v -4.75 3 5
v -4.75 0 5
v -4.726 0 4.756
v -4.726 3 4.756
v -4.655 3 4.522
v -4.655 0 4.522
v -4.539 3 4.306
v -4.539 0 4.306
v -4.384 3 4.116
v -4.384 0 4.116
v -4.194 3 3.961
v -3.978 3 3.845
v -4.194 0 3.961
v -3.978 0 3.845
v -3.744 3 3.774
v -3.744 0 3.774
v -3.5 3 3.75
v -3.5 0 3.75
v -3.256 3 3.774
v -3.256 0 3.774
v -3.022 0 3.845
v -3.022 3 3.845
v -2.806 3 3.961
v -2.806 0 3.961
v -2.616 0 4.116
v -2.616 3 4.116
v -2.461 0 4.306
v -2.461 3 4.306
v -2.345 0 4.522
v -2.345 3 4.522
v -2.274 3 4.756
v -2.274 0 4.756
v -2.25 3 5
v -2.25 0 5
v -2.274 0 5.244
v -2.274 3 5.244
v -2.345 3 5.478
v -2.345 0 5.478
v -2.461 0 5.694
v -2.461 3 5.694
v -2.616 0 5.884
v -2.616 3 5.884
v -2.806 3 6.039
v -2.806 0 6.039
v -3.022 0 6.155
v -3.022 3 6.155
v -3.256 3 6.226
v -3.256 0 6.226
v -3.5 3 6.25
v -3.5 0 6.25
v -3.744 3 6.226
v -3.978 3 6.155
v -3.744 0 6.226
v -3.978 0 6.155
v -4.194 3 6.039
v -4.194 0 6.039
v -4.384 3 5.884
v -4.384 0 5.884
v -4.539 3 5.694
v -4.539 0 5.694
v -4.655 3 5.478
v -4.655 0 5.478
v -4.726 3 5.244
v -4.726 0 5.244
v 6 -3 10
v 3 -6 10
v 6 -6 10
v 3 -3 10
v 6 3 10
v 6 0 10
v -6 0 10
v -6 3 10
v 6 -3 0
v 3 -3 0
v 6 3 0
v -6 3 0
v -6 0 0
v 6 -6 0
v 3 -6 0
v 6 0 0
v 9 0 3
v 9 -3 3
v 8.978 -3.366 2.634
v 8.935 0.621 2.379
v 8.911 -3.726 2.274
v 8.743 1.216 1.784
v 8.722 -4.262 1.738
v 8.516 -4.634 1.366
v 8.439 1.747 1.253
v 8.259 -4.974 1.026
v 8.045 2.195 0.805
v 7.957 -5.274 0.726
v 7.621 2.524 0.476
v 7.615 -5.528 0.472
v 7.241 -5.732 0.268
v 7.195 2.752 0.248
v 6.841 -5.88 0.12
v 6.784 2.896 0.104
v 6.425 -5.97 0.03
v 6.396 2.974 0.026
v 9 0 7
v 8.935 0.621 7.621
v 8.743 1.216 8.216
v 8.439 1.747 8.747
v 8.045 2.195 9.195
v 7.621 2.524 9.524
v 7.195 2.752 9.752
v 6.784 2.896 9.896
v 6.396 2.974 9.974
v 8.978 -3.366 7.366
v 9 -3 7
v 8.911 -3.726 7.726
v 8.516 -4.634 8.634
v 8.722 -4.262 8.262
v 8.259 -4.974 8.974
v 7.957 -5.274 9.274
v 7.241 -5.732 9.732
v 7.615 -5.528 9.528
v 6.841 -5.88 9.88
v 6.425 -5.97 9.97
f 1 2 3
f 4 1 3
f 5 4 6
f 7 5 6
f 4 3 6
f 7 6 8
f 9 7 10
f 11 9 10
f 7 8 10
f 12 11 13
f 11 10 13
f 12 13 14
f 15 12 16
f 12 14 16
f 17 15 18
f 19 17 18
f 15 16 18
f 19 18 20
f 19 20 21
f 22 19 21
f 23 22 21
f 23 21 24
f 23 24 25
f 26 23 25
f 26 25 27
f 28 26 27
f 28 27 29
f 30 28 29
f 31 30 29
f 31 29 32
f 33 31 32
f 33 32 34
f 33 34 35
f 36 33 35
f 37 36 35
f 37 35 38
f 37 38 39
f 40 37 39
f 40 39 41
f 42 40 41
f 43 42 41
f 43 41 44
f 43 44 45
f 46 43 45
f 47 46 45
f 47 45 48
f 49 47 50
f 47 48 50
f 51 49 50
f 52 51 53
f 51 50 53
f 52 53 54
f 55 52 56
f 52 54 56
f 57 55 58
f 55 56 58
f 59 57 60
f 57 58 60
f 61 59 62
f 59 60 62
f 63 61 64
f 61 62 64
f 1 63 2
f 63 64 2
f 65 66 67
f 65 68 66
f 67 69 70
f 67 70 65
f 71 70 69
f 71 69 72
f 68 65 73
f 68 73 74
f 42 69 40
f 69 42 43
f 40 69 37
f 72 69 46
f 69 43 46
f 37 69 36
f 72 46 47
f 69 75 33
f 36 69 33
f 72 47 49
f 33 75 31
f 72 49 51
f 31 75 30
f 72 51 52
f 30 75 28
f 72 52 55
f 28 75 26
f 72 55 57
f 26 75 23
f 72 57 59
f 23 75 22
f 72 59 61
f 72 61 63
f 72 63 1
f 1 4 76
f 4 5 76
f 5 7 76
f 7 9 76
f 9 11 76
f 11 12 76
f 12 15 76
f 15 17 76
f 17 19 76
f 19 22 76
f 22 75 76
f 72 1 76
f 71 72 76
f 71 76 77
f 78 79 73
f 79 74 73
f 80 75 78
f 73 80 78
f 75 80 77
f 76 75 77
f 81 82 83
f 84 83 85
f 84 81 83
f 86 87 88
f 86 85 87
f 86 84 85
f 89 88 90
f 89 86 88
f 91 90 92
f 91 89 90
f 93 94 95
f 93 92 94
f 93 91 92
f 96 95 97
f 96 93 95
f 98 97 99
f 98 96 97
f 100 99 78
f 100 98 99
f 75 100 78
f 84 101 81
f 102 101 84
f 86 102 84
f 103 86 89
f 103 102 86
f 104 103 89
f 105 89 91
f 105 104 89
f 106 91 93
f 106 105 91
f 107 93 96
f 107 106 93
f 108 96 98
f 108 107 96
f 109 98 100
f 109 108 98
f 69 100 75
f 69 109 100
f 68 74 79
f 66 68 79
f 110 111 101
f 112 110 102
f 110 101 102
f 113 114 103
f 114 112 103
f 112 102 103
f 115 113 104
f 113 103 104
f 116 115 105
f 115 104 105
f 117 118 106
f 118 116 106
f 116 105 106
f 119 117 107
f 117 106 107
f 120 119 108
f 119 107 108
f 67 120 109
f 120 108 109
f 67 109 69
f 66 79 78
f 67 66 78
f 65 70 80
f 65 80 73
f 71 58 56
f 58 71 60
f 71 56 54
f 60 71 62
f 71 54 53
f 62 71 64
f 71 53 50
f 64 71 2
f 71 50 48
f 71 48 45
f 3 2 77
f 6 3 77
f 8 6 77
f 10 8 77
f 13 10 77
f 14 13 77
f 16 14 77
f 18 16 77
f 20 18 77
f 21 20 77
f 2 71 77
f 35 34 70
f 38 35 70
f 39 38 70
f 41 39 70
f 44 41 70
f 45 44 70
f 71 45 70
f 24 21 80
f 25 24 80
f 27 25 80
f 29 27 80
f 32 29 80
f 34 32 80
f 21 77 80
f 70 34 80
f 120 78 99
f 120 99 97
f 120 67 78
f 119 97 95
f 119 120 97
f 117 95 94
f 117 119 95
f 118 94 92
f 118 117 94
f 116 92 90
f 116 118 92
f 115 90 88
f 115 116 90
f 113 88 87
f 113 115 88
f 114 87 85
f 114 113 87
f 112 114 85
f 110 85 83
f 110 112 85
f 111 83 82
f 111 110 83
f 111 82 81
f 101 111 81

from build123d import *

# Parameters (mm, degrees)
ESTRUSIONE_ESTRUSIONE1_DEPTH = 10
RACCORDO1_R                  = 3
FORO_FILETTATO_M3X0_5_1_D    = 2.5


with BuildPart() as part:
    # Schizzo1 → Estrusione-Estrusione1 (new body)
    with BuildSketch(Plane.XY):
        Polygon((-6, 0), (6, 0), (6, -3), (3, -3), (3, -6), (9, -6), (9, 3), (-6, 3), align=None)
    extrude(amount=ESTRUSIONE_ESTRUSIONE1_DEPTH)

    # Raccordo1
    raccordo1_edges = [part.edges().sort_by_distance(p)[0] for p in [
        (9, 3, 5),
        (9, -6, 5),
        (9, -1.5, 10),
        (9, -1.5, 0),
    ]]
    fillet(raccordo1_edges, radius=RACCORDO1_R - 0.0001)  # a hair under: the kernel refuses the full size

    # Foro filettato M3x0.5-1 (through all)
    with Locations(Plane(origin=(0, 3, 0), x_dir=(1, 0, 0), z_dir=(0, 1, 0))):
        with Locations((-3.5, -5)):
            Hole(FORO_FILETTATO_M3X0_5_1_D / 2)


solid = part.part
